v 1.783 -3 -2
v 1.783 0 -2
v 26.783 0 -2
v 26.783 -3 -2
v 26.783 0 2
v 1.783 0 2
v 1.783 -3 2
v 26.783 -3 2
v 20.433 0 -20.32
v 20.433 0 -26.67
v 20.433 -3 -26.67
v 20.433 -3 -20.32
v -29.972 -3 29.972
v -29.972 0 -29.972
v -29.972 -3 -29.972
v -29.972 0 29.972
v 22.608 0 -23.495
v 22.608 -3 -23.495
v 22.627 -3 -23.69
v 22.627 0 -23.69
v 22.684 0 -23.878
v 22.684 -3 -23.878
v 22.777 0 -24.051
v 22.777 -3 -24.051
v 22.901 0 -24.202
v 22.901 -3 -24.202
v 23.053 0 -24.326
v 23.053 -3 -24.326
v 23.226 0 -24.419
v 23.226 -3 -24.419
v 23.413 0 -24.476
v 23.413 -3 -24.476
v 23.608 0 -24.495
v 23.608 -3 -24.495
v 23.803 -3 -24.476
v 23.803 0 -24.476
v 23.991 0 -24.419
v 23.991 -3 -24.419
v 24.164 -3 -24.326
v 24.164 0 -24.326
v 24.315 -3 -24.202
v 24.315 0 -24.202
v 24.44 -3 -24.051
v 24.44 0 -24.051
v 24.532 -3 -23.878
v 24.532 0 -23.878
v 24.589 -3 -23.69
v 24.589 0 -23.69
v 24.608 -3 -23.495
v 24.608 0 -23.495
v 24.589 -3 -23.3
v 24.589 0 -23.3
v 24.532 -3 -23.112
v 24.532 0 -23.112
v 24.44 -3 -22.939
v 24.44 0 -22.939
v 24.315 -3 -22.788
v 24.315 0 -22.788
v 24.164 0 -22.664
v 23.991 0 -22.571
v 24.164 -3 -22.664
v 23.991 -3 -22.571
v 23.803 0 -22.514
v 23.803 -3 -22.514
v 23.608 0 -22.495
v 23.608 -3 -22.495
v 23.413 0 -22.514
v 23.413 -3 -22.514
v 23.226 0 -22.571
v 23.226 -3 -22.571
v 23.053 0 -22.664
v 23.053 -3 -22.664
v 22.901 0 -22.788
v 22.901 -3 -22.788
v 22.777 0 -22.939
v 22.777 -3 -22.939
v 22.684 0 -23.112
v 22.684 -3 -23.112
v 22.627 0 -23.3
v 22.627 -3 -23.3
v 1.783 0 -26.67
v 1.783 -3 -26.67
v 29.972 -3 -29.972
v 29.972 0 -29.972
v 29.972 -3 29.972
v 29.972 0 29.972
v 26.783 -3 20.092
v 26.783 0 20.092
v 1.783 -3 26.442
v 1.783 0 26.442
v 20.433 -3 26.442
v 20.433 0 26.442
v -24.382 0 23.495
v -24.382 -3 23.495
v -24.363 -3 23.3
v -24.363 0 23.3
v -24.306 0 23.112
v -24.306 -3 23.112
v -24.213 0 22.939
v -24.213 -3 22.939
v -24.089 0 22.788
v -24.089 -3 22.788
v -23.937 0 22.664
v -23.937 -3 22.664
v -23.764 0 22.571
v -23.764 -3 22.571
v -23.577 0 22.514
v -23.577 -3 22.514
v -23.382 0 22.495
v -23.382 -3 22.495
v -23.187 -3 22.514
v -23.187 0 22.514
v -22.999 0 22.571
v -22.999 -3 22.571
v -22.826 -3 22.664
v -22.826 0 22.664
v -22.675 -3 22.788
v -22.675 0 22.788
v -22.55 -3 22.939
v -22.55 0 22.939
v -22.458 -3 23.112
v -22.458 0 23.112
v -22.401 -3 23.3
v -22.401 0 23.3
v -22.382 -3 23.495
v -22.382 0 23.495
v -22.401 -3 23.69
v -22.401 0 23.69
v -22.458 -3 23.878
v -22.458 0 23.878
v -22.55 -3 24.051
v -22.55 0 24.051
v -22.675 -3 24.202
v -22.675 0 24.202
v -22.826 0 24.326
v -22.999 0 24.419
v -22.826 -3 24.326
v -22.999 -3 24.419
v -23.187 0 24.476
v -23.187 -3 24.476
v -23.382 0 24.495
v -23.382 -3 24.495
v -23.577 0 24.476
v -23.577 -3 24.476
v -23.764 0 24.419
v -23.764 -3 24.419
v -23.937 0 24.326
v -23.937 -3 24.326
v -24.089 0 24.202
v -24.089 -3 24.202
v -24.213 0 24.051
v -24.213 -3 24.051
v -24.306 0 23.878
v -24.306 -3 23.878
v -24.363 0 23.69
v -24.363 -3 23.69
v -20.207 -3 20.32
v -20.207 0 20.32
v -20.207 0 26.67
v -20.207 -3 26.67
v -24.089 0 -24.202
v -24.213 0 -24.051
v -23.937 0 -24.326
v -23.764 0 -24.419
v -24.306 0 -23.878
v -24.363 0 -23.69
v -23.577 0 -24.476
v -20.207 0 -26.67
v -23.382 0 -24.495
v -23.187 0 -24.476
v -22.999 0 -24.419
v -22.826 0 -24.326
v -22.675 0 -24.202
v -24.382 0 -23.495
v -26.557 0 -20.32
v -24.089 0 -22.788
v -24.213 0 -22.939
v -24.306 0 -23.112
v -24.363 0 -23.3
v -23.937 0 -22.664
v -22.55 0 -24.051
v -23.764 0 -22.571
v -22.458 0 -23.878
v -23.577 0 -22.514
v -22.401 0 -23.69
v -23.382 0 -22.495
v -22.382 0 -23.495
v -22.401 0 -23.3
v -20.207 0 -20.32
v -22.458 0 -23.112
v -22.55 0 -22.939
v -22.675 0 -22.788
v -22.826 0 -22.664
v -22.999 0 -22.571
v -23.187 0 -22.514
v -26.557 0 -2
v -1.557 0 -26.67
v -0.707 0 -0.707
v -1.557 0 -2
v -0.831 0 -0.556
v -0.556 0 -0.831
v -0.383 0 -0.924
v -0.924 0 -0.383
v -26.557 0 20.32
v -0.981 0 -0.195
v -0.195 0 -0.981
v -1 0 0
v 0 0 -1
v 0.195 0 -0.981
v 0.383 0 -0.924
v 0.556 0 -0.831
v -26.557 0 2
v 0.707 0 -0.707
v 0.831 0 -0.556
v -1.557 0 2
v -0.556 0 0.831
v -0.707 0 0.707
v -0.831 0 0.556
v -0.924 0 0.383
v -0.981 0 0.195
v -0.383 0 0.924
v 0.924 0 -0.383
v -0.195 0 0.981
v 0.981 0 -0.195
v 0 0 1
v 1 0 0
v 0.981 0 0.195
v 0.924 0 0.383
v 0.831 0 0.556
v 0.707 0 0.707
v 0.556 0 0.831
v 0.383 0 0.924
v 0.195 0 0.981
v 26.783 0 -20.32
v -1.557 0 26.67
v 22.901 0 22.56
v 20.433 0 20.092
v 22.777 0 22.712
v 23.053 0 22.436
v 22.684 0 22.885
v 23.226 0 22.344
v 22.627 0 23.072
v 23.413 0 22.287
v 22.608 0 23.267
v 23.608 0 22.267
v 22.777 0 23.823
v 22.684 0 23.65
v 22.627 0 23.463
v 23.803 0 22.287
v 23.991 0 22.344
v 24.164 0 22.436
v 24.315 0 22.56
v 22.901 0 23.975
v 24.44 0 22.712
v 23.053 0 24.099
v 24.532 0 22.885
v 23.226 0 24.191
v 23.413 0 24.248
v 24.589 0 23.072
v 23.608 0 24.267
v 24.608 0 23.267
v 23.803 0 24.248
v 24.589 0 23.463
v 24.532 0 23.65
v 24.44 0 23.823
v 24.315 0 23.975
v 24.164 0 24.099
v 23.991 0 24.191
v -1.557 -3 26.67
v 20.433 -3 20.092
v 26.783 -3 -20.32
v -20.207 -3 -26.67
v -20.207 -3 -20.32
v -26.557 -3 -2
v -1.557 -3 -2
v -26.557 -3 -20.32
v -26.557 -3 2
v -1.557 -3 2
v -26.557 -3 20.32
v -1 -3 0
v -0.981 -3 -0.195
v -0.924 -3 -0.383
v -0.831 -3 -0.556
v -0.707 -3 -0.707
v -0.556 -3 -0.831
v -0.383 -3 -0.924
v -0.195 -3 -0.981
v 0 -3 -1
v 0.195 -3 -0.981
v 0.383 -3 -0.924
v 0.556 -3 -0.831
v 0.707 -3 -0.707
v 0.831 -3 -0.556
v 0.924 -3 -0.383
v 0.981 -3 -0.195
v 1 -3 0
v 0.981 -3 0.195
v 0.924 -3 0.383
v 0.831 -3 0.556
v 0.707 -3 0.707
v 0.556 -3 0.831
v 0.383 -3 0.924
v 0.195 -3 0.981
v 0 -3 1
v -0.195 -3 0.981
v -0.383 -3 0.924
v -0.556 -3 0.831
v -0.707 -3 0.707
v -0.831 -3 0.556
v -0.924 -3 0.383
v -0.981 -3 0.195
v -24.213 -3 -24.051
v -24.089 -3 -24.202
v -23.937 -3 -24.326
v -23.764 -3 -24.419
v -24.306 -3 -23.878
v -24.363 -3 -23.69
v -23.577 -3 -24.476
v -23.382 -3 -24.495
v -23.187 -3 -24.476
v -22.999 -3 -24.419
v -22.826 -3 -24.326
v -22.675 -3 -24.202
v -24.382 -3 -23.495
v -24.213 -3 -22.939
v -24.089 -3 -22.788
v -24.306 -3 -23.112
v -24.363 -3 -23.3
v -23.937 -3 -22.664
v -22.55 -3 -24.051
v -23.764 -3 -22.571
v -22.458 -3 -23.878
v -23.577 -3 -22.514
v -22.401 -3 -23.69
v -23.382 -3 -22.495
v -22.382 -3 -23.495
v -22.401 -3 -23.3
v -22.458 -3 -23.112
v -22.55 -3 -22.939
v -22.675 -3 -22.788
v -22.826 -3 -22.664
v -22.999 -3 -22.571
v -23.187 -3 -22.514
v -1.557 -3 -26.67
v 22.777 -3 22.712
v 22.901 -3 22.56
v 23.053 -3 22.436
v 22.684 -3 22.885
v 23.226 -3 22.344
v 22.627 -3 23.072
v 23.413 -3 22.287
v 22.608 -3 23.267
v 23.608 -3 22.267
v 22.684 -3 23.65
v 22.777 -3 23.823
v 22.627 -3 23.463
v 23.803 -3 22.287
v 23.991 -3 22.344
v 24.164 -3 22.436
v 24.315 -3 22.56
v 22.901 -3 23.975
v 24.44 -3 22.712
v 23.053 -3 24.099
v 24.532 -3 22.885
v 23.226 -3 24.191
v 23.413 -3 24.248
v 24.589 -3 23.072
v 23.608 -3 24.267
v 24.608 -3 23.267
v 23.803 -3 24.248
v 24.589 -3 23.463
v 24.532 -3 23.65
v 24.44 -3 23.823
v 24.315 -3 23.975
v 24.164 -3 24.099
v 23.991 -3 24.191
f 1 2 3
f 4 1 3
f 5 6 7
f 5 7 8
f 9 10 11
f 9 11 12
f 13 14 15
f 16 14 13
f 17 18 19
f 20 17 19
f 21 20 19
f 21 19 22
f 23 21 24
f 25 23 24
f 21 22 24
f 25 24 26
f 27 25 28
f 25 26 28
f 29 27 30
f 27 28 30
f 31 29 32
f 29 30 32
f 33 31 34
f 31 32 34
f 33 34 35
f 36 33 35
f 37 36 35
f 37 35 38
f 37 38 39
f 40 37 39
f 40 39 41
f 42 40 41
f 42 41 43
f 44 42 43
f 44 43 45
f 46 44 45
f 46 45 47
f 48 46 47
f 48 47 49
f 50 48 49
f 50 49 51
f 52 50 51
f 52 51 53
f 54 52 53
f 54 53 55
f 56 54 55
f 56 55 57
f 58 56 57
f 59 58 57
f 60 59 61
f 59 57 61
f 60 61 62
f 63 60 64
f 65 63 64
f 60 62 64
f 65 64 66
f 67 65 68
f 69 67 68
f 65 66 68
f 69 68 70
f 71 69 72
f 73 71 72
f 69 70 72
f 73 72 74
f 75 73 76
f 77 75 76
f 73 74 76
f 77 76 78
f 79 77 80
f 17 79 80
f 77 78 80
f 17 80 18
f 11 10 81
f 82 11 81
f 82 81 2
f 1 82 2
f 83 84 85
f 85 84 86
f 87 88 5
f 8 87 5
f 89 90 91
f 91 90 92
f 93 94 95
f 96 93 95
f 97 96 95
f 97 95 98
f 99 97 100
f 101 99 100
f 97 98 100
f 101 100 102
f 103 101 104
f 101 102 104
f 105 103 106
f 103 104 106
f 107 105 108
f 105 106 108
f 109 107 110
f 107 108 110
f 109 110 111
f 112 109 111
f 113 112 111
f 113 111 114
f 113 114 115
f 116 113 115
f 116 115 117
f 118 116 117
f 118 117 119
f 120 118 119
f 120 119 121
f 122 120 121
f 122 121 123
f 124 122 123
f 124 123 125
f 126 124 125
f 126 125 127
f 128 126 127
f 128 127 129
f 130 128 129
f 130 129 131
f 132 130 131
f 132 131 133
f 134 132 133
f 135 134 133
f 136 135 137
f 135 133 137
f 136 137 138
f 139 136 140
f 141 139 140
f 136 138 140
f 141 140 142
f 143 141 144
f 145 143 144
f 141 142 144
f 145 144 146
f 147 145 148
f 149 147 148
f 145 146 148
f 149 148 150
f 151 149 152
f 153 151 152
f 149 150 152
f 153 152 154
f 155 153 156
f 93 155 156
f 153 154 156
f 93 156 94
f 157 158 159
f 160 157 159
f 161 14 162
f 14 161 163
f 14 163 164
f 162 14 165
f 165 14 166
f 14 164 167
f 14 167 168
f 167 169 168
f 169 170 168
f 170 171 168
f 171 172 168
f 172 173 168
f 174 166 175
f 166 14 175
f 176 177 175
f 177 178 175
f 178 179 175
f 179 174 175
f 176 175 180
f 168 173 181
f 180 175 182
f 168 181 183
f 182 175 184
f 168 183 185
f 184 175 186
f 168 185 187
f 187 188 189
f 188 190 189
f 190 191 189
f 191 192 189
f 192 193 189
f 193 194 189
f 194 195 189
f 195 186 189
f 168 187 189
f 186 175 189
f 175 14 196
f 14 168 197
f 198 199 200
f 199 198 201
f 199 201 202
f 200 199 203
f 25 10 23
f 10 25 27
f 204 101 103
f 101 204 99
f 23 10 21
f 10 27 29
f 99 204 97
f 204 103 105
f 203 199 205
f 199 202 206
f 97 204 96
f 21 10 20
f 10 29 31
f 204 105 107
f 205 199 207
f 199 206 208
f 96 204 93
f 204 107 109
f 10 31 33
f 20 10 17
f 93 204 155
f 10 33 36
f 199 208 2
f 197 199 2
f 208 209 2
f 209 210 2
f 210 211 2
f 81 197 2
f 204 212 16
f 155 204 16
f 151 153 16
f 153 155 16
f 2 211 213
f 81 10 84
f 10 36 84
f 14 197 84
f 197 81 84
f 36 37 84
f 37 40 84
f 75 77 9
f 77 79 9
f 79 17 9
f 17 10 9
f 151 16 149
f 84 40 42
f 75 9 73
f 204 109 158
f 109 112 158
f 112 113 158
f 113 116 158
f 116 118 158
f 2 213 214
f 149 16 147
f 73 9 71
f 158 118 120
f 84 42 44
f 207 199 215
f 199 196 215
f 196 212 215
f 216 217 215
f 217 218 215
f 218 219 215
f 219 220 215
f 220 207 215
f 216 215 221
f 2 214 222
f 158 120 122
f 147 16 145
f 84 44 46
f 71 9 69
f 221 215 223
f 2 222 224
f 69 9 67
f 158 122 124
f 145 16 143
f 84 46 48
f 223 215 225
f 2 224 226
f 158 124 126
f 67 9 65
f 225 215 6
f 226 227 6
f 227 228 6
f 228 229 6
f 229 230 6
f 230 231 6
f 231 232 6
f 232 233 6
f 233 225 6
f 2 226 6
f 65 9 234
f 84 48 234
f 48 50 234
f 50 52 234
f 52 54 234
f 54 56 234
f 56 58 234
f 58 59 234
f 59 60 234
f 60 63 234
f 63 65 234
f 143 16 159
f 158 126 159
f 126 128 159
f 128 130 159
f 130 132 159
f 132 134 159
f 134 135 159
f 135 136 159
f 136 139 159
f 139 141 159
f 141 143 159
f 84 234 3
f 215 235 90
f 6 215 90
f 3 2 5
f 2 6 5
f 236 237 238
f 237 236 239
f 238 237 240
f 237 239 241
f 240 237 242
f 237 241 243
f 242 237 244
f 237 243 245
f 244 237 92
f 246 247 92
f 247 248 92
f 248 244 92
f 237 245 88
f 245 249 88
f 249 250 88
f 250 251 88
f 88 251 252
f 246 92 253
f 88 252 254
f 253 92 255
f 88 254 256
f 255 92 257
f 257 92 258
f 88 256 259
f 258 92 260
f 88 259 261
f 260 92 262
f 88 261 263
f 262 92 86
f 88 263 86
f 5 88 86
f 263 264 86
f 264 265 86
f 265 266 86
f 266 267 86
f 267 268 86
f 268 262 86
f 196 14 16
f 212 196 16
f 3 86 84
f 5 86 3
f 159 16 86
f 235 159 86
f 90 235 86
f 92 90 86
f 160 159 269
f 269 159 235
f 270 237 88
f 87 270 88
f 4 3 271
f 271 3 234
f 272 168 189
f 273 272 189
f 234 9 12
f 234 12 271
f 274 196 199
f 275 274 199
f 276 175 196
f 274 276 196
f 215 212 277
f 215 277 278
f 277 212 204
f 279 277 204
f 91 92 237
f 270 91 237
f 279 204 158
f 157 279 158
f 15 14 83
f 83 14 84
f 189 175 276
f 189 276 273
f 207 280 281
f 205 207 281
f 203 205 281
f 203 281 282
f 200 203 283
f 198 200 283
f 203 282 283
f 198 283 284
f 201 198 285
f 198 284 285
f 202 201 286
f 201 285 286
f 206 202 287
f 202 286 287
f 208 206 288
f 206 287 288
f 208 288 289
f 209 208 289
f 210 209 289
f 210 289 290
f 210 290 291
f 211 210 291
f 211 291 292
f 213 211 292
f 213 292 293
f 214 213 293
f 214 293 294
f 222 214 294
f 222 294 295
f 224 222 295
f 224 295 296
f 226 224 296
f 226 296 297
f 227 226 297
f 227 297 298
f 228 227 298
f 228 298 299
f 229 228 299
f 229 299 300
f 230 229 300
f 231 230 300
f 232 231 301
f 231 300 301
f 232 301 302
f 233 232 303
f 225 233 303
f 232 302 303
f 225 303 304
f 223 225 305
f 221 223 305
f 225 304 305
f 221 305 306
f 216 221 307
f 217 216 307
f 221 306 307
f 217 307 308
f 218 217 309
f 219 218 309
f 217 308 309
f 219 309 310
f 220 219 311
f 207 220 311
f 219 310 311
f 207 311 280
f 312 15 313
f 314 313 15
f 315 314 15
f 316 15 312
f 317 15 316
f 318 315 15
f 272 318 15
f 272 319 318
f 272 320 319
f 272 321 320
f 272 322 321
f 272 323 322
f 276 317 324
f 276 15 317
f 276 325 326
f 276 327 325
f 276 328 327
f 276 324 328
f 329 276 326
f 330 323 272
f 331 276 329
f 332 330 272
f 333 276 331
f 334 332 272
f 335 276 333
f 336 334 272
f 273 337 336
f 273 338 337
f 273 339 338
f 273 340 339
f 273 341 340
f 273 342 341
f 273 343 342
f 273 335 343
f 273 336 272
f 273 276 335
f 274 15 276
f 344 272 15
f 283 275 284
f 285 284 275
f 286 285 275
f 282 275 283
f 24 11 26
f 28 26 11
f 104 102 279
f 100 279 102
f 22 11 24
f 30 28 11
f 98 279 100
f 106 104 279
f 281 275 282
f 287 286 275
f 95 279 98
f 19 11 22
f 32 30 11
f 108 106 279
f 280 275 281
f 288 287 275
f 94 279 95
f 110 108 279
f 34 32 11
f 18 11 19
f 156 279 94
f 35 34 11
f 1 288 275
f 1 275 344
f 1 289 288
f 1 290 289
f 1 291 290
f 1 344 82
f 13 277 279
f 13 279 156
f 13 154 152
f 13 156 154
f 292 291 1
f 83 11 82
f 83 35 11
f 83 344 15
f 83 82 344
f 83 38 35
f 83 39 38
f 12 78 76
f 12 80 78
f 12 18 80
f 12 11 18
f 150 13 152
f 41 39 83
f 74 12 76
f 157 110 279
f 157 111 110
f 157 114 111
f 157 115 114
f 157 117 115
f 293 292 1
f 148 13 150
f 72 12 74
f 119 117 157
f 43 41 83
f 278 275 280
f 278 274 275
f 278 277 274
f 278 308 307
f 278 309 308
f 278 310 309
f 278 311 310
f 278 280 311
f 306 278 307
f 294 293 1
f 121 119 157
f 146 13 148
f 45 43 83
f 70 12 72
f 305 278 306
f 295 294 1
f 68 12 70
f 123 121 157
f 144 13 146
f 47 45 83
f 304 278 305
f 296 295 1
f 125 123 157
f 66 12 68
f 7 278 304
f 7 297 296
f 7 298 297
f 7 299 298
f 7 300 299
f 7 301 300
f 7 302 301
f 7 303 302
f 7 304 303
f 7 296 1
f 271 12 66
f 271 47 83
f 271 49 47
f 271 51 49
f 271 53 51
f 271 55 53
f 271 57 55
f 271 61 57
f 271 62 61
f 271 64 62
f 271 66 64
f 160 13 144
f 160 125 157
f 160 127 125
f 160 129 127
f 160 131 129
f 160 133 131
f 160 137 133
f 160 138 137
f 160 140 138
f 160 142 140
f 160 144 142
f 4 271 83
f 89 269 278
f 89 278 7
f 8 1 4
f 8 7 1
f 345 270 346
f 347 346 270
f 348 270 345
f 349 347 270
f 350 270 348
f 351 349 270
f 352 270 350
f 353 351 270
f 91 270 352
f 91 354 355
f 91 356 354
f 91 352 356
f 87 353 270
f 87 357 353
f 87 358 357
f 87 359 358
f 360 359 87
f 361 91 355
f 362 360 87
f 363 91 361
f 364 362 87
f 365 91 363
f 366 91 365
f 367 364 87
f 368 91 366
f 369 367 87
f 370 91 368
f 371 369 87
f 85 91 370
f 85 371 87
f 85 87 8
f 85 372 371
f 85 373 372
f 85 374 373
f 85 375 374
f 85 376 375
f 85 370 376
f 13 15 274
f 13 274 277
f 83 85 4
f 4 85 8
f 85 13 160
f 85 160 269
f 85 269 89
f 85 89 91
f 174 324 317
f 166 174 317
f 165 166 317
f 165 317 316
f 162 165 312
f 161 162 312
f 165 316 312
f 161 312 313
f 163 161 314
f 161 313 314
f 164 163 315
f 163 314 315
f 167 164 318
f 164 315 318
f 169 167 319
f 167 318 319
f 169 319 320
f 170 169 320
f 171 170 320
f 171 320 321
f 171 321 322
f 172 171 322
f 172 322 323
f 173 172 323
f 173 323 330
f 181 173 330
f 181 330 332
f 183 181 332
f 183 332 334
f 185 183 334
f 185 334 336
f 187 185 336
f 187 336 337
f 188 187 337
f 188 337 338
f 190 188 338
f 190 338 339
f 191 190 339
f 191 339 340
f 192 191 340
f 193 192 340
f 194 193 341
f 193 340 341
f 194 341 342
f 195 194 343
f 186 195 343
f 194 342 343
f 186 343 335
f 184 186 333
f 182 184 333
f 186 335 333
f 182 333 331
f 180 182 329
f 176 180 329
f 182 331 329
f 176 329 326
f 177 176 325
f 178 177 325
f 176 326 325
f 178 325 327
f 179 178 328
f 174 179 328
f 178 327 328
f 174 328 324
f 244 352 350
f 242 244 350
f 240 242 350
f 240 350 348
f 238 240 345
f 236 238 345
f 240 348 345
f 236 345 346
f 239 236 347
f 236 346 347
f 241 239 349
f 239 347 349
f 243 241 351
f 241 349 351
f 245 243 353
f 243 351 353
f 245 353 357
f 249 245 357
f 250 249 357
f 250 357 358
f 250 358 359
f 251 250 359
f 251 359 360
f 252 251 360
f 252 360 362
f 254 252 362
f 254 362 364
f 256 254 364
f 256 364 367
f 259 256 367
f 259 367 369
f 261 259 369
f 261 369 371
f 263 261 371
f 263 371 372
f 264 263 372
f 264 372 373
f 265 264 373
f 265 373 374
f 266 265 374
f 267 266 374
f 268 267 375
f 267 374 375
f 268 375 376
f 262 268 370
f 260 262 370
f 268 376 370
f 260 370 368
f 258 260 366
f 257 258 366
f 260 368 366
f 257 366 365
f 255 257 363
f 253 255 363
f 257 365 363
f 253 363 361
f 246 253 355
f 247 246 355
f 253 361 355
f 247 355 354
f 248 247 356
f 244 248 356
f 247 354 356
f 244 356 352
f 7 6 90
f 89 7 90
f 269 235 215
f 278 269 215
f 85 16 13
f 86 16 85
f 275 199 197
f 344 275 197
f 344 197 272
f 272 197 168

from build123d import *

# Parameters (mm, degrees)
F0_W     = 59.944
F0_H     = 59.944
F0_W_2   = 25
F0_H_2   = 2
F0_W_3   = 6.35
F0_H_3   = 6.35
F1_DEPTH = 3
F2_D     = 2


# Not quite as in the source:
# - a feature names something its author has since deleted; it is built from what else it names


with BuildPart() as f1:
    # F0 (on Front) → F1 (new body)
    with BuildSketch(Plane.XZ):
        Rectangle(F0_W, F0_H)
        Polygon((-26.5568002729, 26.67), (-20.2068002729, 26.67), (-1.5568002729, 26.67), (-1.5568002729, 20.32), (-1.5568002729, 2), (-1.5568002729, 0), (-1.5568002729, -2), (-1.5568002729, -20.32), (-1.5568002729, -26.67), (-20.2068002729, -26.67), (-26.5568002729, -26.67), (-26.5568002729, -20.32), (-26.5568002729, -2), (-26.5568002729, 0), (-26.5568002729, 2), (-26.5568002729, 20.32), align=None, mode=Mode.SUBTRACT)
        Polygon((20.4331997271, 26.4424991059), (26.7831997271, 26.4424991059), (26.7831997271, 20.0924991059), (26.7831997271, 2), (26.7831997271, 0), (26.7831997271, -2), (26.7831997271, -20.32), (26.7831997271, -26.67), (20.4331997271, -26.67), (1.7831997271, -26.67), (1.7831997271, -20.32), (1.7831997271, -2), (1.7831997271, 0), (1.7831997271, 2), (1.7831997271, 20.0924991059), (1.7831997271, 26.4424991059), align=None, mode=Mode.SUBTRACT)
        with Locations((14.2831997271, 1)):
            Rectangle(F0_W_2, F0_H_2)
        with Locations((14.2831997271, -1)):
            Rectangle(F0_W_2, F0_H_2)
        with Locations((-14.0568002729, 1)):
            Rectangle(F0_W_2, F0_H_2)
        with Locations((-14.0568002729, -1)):
            Rectangle(F0_W_2, F0_H_2)
        Polygon((-20.2068002729, 26.4424991059), (-20.2068002729, 26.67), (-26.5568002729, 26.67), (-26.5568002729, 20.32), (-20.2068002729, 20.32), align=None)
        Polygon((26.7831997271, 20.0924991059), (26.7831997271, 26.4424991059), (20.4331997271, 26.4424991059), (20.4331997271, 20.32), (20.4331997271, 20.0924991059), align=None)
        with Locations((23.6081997271, -23.495)):
            Rectangle(F0_W_3, F0_H_3)
        with Locations((-23.3818002729, -23.495)):
            Rectangle(F0_W_3, F0_H_3)
    extrude(amount=F1_DEPTH)

    # F2 (through all)
    with Locations(Plane(origin=(0, 0, 0), x_dir=(1, 0, 0), z_dir=(0, 1, 0))):
        with Locations((23.6081997271, -23.2674991059), (0, 0), (23.6081997271, 23.495), (-23.3818002729, -23.495), (-23.3818002729, 23.495)):
            Hole(F2_D / 2)


solid = f1.part
